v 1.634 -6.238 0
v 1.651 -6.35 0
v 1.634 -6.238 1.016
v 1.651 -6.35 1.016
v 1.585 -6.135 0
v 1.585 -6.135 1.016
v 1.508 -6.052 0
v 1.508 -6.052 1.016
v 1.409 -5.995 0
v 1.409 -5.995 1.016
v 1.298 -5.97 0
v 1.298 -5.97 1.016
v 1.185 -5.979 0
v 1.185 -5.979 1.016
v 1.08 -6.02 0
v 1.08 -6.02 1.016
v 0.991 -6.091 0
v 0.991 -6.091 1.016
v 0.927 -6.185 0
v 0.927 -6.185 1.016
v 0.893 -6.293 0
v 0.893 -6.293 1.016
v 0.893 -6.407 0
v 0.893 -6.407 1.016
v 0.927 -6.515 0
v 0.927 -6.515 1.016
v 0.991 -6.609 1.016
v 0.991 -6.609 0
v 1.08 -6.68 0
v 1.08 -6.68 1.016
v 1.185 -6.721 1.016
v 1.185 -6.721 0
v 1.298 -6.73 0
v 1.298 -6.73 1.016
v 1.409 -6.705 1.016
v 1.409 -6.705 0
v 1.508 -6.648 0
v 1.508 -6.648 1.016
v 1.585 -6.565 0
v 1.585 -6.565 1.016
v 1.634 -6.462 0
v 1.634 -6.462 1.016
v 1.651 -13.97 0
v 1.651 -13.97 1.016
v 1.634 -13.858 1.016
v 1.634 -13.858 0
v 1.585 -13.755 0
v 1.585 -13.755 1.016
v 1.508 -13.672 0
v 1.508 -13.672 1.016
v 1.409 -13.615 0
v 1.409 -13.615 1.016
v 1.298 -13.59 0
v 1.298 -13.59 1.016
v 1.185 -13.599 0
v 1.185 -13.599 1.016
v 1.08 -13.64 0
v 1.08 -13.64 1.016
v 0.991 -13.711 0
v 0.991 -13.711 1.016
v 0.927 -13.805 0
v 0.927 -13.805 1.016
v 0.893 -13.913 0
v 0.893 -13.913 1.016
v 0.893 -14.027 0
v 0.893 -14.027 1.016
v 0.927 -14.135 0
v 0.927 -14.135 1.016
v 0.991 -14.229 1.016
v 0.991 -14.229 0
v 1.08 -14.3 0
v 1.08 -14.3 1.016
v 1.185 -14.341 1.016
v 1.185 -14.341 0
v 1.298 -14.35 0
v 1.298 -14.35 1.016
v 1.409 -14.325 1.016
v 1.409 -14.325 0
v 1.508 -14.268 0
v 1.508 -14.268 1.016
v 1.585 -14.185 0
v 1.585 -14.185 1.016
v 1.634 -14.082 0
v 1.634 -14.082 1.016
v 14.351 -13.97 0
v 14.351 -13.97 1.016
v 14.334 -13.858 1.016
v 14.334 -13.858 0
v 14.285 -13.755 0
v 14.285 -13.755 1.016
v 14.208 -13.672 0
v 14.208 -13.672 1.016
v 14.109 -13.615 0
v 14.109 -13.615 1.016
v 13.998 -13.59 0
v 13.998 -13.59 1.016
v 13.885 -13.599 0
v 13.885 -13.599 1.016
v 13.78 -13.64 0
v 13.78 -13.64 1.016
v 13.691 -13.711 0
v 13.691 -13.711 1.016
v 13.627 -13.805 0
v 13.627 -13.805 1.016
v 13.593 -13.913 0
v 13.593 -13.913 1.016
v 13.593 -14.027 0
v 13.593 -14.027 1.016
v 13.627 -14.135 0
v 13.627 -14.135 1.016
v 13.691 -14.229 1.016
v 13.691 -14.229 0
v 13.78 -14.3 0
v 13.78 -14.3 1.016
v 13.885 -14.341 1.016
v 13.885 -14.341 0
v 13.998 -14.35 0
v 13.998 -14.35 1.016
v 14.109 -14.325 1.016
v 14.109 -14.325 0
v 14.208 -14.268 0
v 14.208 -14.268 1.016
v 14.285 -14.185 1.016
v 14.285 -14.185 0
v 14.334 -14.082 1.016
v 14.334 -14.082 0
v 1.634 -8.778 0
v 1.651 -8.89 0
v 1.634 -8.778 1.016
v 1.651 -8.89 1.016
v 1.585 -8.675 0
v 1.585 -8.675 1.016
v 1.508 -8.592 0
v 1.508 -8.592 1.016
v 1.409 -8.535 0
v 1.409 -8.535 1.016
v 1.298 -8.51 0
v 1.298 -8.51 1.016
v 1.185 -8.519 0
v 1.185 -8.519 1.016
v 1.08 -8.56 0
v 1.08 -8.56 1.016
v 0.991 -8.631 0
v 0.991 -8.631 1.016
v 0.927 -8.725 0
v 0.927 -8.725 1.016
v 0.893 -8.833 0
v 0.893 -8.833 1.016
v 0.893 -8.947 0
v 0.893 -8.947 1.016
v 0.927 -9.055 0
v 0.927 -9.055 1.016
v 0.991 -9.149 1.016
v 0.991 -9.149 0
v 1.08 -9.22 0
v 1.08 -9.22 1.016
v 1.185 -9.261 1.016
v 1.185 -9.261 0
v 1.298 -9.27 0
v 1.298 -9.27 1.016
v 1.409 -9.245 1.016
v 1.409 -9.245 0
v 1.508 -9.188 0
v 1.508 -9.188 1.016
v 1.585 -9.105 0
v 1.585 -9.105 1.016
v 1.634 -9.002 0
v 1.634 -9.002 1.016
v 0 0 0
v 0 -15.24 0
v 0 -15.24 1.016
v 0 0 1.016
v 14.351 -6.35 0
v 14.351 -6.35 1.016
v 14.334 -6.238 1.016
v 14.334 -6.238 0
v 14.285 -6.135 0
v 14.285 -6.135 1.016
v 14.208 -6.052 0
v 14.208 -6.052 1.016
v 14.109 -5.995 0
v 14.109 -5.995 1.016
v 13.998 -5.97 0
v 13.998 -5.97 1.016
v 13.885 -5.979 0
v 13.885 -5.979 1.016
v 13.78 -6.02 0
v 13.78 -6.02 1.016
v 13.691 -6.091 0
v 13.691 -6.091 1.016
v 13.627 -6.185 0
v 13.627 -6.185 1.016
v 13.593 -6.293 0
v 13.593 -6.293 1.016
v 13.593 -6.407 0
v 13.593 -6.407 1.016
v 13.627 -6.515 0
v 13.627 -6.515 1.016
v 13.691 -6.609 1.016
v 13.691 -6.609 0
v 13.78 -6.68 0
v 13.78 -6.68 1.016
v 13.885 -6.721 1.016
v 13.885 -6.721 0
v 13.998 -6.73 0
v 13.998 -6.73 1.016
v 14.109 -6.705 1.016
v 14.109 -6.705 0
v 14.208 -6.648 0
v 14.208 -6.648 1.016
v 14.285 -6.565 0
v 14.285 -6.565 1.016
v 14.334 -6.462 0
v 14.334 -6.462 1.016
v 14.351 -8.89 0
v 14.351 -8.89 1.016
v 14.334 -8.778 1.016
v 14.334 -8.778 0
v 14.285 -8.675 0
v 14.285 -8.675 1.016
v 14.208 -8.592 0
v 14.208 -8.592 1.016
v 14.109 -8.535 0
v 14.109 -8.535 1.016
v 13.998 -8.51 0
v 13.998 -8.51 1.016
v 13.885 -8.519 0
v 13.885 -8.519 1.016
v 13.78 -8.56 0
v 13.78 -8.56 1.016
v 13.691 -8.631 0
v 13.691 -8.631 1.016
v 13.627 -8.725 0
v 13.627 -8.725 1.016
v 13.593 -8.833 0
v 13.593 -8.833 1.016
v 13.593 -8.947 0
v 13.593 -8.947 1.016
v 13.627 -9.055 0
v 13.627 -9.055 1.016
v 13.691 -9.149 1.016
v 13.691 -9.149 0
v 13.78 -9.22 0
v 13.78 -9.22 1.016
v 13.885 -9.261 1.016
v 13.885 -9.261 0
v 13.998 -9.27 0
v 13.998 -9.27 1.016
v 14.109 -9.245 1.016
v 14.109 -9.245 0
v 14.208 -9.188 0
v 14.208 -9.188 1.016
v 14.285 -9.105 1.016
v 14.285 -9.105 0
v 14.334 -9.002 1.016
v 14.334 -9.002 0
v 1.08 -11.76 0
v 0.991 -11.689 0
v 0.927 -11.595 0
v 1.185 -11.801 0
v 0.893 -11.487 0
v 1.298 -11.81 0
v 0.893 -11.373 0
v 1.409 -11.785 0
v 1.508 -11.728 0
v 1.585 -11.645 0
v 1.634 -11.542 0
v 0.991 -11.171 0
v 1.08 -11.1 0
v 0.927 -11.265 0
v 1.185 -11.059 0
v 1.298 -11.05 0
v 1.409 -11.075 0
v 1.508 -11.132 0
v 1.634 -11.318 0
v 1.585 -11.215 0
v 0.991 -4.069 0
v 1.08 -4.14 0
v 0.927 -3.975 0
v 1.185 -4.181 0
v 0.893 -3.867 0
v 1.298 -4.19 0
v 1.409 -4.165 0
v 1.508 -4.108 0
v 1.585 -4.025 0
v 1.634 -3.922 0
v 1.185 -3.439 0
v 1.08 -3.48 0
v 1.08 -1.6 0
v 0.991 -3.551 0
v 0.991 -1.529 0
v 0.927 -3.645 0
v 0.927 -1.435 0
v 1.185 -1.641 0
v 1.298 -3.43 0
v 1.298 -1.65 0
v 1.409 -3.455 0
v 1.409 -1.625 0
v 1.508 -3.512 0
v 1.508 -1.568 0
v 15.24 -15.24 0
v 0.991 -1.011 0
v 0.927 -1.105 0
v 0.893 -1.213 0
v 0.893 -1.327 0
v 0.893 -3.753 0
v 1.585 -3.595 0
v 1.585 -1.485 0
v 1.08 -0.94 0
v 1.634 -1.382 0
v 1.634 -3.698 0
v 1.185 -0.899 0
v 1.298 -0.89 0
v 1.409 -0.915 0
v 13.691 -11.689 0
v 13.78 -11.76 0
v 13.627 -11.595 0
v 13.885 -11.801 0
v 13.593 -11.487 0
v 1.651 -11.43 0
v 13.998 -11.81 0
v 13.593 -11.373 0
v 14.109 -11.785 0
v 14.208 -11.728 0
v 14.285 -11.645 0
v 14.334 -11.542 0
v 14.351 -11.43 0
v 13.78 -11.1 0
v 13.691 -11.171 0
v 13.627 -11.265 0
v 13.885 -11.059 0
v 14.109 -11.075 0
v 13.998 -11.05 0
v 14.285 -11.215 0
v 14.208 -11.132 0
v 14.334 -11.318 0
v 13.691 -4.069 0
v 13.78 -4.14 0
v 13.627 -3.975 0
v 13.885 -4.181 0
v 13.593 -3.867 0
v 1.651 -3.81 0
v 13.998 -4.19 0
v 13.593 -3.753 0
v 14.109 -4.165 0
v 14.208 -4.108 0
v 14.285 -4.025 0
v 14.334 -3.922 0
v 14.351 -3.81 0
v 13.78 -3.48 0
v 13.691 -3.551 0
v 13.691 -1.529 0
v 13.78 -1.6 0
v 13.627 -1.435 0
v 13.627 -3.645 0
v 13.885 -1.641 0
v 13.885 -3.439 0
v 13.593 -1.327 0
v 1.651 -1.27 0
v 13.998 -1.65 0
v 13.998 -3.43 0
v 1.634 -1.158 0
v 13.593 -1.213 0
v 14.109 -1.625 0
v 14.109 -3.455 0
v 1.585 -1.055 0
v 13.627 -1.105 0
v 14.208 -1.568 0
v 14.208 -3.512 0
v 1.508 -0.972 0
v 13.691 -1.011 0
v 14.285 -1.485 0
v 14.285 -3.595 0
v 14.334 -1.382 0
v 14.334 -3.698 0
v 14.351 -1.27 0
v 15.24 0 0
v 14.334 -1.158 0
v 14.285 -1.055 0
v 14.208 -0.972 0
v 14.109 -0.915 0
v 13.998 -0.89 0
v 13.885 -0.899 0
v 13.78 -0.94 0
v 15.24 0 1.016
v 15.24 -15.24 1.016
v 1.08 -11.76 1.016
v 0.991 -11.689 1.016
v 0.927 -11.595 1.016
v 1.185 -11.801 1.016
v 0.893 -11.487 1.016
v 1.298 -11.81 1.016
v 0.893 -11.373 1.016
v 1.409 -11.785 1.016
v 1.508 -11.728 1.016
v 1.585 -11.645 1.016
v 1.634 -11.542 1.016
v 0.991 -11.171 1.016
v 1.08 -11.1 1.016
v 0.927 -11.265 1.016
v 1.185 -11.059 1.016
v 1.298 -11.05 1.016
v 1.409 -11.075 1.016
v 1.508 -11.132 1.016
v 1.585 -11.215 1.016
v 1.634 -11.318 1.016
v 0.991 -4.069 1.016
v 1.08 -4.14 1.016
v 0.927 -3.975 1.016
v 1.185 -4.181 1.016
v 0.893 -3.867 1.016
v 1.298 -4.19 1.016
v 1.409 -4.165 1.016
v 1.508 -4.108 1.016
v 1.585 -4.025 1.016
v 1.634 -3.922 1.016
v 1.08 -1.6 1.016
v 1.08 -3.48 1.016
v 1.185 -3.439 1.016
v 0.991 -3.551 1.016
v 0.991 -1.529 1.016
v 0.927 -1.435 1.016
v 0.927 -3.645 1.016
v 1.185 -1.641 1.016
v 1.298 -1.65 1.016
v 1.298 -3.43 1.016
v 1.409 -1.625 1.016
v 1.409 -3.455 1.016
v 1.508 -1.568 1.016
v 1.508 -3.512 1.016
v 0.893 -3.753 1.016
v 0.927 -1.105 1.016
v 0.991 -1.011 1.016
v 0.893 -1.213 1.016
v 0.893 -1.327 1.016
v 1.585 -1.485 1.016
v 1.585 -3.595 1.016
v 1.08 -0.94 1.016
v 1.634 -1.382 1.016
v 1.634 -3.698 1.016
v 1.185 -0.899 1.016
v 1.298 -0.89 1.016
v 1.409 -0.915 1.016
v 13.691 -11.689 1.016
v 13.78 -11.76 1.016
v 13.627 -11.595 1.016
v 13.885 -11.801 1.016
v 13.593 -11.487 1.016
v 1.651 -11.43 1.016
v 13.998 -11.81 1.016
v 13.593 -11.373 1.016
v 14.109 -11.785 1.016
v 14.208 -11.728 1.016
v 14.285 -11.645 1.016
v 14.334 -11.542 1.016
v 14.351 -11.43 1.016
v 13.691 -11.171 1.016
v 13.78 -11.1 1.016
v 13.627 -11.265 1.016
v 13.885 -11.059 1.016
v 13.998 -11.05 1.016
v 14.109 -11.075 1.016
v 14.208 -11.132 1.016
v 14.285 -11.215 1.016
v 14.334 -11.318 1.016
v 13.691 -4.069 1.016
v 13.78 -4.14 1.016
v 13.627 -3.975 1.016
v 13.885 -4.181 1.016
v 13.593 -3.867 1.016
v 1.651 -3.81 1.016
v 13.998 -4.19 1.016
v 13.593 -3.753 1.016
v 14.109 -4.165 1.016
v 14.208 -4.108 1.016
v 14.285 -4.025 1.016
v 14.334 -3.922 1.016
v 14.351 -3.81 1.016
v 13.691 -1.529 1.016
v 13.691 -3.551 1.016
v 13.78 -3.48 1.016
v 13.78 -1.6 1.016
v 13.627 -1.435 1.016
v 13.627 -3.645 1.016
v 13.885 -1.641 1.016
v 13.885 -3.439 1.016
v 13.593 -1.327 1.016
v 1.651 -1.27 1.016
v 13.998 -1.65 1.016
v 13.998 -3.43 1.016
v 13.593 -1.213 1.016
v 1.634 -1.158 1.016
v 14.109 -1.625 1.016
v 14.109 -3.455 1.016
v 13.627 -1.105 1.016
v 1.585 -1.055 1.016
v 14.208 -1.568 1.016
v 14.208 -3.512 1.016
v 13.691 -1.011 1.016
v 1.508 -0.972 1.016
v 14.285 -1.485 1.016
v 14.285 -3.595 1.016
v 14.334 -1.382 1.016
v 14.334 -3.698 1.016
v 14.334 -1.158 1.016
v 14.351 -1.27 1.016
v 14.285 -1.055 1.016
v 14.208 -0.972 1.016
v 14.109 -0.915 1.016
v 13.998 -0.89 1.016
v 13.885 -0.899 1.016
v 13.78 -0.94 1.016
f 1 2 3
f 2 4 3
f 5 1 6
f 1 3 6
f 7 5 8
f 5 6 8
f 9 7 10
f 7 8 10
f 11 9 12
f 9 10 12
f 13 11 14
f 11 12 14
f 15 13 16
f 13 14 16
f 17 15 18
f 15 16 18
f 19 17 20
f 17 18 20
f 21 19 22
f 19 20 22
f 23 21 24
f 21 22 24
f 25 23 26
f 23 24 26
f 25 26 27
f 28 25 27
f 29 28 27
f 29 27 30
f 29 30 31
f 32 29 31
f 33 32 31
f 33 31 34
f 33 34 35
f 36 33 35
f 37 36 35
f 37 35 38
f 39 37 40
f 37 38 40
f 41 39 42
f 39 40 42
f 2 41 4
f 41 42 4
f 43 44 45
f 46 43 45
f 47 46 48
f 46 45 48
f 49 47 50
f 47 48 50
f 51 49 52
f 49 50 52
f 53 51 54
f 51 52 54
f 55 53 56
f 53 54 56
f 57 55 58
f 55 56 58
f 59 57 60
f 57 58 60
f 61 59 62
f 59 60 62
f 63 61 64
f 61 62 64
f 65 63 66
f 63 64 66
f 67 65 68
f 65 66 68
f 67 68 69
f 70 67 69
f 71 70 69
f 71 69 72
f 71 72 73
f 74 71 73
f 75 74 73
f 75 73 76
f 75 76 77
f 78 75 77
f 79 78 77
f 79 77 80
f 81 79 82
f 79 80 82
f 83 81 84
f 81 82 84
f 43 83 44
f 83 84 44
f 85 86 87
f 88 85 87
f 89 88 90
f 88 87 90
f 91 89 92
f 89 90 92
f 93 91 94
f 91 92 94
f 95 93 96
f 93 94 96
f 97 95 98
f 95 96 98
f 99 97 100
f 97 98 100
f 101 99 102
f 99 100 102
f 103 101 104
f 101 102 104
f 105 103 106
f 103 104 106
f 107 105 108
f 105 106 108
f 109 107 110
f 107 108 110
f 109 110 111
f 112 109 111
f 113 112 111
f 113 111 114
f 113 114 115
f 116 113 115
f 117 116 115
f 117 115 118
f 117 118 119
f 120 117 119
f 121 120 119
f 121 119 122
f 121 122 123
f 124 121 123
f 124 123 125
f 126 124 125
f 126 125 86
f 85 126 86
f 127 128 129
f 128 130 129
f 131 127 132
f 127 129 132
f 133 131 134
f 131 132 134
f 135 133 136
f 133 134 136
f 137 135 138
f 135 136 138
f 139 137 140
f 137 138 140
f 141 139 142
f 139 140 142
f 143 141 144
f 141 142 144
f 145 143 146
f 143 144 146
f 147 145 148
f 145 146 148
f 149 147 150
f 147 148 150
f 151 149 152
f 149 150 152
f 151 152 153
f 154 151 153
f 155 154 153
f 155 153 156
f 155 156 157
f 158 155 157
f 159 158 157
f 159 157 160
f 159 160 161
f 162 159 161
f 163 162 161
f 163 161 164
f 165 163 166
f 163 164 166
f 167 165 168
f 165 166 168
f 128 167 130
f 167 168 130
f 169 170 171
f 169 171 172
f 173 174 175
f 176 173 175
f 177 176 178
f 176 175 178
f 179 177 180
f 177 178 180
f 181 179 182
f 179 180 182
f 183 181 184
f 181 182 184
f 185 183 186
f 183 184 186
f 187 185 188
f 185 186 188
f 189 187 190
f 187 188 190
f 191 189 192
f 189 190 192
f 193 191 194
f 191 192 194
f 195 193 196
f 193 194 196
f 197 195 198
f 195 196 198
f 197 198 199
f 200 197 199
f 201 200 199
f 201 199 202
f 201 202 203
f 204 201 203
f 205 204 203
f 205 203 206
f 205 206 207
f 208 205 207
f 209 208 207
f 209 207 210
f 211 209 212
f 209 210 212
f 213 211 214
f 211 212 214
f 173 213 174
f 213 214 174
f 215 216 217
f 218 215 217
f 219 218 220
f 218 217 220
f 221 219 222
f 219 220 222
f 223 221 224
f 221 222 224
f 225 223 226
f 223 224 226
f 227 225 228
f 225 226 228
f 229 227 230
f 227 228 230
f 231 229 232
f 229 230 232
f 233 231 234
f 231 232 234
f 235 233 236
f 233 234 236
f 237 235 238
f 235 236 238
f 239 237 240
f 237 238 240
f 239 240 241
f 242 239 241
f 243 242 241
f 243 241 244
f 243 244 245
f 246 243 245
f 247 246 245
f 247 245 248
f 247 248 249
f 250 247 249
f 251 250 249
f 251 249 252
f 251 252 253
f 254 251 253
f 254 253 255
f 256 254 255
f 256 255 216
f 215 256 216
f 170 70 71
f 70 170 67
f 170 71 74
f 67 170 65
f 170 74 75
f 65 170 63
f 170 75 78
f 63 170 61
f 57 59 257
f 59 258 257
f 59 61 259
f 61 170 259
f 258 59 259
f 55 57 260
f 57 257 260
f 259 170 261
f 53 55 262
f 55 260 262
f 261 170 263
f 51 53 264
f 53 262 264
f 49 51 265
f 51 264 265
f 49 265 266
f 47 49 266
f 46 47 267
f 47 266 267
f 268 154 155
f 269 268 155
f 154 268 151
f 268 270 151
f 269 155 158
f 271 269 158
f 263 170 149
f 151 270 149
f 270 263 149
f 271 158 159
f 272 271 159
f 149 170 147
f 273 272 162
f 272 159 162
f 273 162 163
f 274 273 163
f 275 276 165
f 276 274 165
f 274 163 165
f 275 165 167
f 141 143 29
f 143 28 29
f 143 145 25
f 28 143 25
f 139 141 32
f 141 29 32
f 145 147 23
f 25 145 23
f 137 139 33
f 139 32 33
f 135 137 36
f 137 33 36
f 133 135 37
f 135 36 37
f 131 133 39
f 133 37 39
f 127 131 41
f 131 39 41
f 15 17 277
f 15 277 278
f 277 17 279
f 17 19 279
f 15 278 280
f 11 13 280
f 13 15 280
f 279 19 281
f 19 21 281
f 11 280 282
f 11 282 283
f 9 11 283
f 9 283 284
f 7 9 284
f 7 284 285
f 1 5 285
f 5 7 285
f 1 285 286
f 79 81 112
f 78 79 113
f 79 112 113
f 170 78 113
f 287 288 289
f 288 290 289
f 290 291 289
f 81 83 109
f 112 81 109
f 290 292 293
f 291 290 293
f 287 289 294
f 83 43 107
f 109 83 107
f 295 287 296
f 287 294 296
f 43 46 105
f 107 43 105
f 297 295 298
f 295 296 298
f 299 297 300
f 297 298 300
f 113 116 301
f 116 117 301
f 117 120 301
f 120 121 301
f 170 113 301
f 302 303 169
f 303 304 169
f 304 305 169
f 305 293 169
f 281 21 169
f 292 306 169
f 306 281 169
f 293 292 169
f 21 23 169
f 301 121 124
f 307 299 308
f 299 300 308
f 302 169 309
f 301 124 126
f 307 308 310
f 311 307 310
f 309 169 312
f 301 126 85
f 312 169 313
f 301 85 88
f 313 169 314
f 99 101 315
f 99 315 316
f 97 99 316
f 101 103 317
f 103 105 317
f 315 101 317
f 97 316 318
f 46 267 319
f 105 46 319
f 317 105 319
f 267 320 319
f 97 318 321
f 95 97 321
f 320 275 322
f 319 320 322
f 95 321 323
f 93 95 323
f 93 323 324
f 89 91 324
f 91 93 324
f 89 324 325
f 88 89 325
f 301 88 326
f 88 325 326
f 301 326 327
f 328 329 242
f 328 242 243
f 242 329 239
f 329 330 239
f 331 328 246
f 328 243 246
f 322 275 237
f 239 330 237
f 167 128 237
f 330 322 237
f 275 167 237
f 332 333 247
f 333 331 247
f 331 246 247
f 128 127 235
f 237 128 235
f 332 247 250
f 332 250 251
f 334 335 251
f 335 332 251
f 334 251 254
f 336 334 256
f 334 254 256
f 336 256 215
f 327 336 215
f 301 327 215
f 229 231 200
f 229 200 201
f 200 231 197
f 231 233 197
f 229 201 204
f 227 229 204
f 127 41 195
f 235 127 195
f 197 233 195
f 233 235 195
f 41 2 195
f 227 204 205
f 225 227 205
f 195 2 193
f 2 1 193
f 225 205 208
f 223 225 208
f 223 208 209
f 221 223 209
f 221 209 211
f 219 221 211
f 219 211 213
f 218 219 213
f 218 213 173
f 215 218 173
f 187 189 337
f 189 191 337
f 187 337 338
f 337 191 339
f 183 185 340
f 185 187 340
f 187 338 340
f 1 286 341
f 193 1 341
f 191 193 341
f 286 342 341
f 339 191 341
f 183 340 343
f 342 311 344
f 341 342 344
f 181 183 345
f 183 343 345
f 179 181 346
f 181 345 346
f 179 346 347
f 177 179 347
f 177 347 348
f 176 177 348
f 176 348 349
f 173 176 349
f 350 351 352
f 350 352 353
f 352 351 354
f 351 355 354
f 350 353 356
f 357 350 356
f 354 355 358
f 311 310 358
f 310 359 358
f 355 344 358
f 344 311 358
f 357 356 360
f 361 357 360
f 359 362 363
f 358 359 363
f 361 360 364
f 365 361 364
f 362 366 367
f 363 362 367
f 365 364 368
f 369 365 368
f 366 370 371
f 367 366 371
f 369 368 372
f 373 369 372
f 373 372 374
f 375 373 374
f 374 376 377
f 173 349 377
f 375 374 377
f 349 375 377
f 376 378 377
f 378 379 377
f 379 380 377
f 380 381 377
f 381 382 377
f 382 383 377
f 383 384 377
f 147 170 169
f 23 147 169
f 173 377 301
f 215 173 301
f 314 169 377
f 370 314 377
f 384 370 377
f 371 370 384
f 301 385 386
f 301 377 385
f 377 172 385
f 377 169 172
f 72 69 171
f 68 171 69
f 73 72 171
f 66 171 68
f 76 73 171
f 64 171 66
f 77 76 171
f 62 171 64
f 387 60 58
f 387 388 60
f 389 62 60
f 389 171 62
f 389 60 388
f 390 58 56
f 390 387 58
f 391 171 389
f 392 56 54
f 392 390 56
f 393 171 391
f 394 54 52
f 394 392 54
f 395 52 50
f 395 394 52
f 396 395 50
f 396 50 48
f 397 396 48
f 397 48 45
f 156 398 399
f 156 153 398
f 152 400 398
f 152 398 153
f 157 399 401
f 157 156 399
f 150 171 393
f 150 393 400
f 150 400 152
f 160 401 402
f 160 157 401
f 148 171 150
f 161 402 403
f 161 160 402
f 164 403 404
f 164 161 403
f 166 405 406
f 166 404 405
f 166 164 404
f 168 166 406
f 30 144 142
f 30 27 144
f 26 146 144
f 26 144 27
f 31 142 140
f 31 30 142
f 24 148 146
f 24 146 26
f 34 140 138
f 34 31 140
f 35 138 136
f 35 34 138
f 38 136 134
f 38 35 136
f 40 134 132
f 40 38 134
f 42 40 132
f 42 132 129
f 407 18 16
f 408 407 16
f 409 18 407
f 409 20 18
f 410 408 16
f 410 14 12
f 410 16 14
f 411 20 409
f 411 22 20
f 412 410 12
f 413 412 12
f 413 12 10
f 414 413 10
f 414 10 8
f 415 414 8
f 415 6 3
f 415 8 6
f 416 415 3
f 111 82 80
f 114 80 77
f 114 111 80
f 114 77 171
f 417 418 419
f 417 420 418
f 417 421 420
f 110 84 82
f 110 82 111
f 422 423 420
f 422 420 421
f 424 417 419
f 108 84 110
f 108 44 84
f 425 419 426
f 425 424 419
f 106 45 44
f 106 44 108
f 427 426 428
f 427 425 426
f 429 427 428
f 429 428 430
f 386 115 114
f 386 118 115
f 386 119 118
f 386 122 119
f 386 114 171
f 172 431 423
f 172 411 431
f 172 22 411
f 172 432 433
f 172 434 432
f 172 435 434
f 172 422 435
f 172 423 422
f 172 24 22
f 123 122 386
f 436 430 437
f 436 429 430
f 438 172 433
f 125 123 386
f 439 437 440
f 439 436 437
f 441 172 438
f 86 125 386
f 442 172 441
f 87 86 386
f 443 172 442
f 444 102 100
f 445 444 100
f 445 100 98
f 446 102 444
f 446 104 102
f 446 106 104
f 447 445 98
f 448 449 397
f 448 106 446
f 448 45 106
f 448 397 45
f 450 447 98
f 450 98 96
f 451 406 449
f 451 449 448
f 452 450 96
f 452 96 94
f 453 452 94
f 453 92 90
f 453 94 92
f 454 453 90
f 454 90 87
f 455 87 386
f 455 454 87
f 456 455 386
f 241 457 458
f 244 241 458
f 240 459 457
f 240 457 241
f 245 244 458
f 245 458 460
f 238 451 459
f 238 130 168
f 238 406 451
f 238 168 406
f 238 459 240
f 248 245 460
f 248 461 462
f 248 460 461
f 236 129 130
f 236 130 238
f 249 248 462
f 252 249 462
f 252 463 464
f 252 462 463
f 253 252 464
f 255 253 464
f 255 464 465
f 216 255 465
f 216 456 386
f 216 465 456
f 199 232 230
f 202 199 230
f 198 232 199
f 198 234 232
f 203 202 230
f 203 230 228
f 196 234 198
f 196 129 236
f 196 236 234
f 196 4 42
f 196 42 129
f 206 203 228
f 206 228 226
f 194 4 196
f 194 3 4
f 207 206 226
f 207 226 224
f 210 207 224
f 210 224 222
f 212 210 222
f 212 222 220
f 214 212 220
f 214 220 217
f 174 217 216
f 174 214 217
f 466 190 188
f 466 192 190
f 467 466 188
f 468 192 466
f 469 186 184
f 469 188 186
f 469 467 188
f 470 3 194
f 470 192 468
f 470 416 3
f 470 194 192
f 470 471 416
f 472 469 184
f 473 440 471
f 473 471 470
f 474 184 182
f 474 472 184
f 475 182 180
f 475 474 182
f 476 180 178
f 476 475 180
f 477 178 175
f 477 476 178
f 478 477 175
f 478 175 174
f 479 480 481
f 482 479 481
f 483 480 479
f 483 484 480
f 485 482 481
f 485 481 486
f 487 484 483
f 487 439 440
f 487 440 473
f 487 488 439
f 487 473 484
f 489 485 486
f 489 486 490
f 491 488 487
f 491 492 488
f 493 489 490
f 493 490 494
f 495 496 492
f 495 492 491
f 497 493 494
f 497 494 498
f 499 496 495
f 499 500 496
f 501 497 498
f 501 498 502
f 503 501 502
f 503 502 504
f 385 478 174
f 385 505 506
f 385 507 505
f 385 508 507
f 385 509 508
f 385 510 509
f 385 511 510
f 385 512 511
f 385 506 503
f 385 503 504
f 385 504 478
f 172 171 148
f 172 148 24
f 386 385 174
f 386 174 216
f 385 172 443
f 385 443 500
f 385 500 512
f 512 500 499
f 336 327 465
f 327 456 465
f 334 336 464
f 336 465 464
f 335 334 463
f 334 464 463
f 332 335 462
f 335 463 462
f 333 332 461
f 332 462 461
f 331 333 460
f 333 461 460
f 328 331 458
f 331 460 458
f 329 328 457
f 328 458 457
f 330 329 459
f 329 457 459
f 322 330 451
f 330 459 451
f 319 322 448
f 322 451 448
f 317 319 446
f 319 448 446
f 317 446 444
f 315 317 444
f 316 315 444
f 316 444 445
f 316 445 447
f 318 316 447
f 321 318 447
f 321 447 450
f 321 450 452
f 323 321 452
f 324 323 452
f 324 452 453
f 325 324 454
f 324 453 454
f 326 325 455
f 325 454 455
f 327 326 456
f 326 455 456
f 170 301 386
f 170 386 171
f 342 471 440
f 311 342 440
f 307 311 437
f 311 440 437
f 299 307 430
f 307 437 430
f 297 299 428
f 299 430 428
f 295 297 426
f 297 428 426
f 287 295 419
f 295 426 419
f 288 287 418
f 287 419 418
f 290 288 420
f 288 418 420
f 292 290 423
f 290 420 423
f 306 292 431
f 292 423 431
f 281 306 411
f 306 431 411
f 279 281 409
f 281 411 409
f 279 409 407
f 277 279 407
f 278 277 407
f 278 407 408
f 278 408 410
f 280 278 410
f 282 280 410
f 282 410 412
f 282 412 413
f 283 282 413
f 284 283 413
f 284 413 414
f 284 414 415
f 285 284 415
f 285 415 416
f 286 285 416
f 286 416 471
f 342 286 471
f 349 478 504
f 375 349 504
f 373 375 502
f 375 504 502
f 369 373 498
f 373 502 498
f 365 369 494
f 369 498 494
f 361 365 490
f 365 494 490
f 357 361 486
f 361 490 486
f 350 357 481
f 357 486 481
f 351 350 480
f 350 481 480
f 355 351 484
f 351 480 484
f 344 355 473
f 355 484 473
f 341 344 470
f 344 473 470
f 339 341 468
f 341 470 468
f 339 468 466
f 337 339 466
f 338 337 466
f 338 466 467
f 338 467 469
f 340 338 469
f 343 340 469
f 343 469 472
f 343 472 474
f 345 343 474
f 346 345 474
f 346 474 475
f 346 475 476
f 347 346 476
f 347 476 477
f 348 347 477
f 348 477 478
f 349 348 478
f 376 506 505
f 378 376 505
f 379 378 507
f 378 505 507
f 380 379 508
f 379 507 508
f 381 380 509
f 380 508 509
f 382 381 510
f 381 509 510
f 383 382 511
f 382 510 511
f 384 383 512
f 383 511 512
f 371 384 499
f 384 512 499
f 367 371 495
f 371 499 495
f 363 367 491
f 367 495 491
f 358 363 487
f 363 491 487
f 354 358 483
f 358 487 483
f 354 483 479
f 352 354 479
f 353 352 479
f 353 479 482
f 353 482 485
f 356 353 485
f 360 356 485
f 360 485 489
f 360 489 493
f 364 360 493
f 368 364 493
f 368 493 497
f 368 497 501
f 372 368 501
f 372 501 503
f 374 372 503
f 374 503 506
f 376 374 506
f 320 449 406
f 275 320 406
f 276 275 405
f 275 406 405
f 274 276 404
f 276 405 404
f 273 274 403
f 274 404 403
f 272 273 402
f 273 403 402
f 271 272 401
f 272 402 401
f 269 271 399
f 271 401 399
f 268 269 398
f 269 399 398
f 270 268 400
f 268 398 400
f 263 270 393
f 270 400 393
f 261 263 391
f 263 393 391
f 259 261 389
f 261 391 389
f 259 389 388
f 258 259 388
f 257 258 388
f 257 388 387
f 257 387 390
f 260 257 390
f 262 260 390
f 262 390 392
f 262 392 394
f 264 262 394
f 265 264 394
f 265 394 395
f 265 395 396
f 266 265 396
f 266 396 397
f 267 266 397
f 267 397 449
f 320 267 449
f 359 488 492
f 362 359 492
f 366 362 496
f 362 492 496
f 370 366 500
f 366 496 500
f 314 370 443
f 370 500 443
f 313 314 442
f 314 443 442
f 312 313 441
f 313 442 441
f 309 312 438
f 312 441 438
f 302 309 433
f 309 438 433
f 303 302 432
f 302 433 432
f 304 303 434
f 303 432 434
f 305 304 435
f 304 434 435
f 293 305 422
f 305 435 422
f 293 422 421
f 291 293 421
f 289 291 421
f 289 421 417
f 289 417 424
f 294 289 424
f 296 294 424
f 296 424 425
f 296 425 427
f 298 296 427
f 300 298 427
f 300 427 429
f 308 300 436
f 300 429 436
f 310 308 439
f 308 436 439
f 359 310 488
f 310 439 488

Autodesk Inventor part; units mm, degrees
ref_plane "YZ Plane" through (0, 0, 0) normal (1, 0, 0) x (0, 1, 0)
ref_plane "XZ Plane" through (0, 0, 0) normal (0, 1, 0) x (-1, 0, 0)
ref_plane "XY Plane" through (0, 0, 0) normal (0, 0, 1) x (1, 0, 0)
sketch "Sketch1" plane through (0, 0, 0) normal (0, 0, 1) x (1, 0, 0)
  line L0 (0, 0) -> (15.24, 0)
  line L1 (15.24, 0) -> (15.24, -15.24)
  line L2 (15.24, -15.24) -> (0, -15.24)
  line L3 (0, -15.24) -> (0, 0)
  dimension "d0" = 15.24
  dimension "d1" = 15.24
extrude "Extrusion1" add sketch "Sketch1" along normal blind 1.016
sketch "Sketch2" plane through (0, 0, 1.016) normal (0, 0, 1) x (1, 0, 0)
  line L0 (15.24, 0) -> (0, 0) projected
  line L1 (0, 0) -> (0, -15.24) projected
  line L2 (15.24, -15.24) -> (15.24, 0) projected
  circle A0 centre (13.97, -1.27) radius 0.381
  circle A1 centre (13.97, -3.81) radius 0.381
  circle A2 centre (13.97, -6.35) radius 0.381
  circle A3 centre (13.97, -8.89) radius 0.381
  circle A4 centre (13.97, -11.43) radius 0.381
  circle A5 centre (13.97, -13.97) radius 0.381
  circle A6 centre (1.27, -1.27) radius 0.381
  circle A7 centre (1.27, -3.81) radius 0.381
  circle A8 centre (1.27, -6.35) radius 0.381
  circle A9 centre (1.27, -8.89) radius 0.381
  circle A10 centre (1.27, -11.43) radius 0.381
  circle A11 centre (1.27, -13.97) radius 0.381
  dimension "d4" = 0.762
  dimension "d6" = 1.27
  dimension "d7" = 1.27
  dimension "d10" = 2.54
  dimension "d17" = 12.7
extrude "Extrusion2" cut sketch "Sketch2" against normal blind 1.27
properties part number "Board" material "Thermoplastic Resin"
